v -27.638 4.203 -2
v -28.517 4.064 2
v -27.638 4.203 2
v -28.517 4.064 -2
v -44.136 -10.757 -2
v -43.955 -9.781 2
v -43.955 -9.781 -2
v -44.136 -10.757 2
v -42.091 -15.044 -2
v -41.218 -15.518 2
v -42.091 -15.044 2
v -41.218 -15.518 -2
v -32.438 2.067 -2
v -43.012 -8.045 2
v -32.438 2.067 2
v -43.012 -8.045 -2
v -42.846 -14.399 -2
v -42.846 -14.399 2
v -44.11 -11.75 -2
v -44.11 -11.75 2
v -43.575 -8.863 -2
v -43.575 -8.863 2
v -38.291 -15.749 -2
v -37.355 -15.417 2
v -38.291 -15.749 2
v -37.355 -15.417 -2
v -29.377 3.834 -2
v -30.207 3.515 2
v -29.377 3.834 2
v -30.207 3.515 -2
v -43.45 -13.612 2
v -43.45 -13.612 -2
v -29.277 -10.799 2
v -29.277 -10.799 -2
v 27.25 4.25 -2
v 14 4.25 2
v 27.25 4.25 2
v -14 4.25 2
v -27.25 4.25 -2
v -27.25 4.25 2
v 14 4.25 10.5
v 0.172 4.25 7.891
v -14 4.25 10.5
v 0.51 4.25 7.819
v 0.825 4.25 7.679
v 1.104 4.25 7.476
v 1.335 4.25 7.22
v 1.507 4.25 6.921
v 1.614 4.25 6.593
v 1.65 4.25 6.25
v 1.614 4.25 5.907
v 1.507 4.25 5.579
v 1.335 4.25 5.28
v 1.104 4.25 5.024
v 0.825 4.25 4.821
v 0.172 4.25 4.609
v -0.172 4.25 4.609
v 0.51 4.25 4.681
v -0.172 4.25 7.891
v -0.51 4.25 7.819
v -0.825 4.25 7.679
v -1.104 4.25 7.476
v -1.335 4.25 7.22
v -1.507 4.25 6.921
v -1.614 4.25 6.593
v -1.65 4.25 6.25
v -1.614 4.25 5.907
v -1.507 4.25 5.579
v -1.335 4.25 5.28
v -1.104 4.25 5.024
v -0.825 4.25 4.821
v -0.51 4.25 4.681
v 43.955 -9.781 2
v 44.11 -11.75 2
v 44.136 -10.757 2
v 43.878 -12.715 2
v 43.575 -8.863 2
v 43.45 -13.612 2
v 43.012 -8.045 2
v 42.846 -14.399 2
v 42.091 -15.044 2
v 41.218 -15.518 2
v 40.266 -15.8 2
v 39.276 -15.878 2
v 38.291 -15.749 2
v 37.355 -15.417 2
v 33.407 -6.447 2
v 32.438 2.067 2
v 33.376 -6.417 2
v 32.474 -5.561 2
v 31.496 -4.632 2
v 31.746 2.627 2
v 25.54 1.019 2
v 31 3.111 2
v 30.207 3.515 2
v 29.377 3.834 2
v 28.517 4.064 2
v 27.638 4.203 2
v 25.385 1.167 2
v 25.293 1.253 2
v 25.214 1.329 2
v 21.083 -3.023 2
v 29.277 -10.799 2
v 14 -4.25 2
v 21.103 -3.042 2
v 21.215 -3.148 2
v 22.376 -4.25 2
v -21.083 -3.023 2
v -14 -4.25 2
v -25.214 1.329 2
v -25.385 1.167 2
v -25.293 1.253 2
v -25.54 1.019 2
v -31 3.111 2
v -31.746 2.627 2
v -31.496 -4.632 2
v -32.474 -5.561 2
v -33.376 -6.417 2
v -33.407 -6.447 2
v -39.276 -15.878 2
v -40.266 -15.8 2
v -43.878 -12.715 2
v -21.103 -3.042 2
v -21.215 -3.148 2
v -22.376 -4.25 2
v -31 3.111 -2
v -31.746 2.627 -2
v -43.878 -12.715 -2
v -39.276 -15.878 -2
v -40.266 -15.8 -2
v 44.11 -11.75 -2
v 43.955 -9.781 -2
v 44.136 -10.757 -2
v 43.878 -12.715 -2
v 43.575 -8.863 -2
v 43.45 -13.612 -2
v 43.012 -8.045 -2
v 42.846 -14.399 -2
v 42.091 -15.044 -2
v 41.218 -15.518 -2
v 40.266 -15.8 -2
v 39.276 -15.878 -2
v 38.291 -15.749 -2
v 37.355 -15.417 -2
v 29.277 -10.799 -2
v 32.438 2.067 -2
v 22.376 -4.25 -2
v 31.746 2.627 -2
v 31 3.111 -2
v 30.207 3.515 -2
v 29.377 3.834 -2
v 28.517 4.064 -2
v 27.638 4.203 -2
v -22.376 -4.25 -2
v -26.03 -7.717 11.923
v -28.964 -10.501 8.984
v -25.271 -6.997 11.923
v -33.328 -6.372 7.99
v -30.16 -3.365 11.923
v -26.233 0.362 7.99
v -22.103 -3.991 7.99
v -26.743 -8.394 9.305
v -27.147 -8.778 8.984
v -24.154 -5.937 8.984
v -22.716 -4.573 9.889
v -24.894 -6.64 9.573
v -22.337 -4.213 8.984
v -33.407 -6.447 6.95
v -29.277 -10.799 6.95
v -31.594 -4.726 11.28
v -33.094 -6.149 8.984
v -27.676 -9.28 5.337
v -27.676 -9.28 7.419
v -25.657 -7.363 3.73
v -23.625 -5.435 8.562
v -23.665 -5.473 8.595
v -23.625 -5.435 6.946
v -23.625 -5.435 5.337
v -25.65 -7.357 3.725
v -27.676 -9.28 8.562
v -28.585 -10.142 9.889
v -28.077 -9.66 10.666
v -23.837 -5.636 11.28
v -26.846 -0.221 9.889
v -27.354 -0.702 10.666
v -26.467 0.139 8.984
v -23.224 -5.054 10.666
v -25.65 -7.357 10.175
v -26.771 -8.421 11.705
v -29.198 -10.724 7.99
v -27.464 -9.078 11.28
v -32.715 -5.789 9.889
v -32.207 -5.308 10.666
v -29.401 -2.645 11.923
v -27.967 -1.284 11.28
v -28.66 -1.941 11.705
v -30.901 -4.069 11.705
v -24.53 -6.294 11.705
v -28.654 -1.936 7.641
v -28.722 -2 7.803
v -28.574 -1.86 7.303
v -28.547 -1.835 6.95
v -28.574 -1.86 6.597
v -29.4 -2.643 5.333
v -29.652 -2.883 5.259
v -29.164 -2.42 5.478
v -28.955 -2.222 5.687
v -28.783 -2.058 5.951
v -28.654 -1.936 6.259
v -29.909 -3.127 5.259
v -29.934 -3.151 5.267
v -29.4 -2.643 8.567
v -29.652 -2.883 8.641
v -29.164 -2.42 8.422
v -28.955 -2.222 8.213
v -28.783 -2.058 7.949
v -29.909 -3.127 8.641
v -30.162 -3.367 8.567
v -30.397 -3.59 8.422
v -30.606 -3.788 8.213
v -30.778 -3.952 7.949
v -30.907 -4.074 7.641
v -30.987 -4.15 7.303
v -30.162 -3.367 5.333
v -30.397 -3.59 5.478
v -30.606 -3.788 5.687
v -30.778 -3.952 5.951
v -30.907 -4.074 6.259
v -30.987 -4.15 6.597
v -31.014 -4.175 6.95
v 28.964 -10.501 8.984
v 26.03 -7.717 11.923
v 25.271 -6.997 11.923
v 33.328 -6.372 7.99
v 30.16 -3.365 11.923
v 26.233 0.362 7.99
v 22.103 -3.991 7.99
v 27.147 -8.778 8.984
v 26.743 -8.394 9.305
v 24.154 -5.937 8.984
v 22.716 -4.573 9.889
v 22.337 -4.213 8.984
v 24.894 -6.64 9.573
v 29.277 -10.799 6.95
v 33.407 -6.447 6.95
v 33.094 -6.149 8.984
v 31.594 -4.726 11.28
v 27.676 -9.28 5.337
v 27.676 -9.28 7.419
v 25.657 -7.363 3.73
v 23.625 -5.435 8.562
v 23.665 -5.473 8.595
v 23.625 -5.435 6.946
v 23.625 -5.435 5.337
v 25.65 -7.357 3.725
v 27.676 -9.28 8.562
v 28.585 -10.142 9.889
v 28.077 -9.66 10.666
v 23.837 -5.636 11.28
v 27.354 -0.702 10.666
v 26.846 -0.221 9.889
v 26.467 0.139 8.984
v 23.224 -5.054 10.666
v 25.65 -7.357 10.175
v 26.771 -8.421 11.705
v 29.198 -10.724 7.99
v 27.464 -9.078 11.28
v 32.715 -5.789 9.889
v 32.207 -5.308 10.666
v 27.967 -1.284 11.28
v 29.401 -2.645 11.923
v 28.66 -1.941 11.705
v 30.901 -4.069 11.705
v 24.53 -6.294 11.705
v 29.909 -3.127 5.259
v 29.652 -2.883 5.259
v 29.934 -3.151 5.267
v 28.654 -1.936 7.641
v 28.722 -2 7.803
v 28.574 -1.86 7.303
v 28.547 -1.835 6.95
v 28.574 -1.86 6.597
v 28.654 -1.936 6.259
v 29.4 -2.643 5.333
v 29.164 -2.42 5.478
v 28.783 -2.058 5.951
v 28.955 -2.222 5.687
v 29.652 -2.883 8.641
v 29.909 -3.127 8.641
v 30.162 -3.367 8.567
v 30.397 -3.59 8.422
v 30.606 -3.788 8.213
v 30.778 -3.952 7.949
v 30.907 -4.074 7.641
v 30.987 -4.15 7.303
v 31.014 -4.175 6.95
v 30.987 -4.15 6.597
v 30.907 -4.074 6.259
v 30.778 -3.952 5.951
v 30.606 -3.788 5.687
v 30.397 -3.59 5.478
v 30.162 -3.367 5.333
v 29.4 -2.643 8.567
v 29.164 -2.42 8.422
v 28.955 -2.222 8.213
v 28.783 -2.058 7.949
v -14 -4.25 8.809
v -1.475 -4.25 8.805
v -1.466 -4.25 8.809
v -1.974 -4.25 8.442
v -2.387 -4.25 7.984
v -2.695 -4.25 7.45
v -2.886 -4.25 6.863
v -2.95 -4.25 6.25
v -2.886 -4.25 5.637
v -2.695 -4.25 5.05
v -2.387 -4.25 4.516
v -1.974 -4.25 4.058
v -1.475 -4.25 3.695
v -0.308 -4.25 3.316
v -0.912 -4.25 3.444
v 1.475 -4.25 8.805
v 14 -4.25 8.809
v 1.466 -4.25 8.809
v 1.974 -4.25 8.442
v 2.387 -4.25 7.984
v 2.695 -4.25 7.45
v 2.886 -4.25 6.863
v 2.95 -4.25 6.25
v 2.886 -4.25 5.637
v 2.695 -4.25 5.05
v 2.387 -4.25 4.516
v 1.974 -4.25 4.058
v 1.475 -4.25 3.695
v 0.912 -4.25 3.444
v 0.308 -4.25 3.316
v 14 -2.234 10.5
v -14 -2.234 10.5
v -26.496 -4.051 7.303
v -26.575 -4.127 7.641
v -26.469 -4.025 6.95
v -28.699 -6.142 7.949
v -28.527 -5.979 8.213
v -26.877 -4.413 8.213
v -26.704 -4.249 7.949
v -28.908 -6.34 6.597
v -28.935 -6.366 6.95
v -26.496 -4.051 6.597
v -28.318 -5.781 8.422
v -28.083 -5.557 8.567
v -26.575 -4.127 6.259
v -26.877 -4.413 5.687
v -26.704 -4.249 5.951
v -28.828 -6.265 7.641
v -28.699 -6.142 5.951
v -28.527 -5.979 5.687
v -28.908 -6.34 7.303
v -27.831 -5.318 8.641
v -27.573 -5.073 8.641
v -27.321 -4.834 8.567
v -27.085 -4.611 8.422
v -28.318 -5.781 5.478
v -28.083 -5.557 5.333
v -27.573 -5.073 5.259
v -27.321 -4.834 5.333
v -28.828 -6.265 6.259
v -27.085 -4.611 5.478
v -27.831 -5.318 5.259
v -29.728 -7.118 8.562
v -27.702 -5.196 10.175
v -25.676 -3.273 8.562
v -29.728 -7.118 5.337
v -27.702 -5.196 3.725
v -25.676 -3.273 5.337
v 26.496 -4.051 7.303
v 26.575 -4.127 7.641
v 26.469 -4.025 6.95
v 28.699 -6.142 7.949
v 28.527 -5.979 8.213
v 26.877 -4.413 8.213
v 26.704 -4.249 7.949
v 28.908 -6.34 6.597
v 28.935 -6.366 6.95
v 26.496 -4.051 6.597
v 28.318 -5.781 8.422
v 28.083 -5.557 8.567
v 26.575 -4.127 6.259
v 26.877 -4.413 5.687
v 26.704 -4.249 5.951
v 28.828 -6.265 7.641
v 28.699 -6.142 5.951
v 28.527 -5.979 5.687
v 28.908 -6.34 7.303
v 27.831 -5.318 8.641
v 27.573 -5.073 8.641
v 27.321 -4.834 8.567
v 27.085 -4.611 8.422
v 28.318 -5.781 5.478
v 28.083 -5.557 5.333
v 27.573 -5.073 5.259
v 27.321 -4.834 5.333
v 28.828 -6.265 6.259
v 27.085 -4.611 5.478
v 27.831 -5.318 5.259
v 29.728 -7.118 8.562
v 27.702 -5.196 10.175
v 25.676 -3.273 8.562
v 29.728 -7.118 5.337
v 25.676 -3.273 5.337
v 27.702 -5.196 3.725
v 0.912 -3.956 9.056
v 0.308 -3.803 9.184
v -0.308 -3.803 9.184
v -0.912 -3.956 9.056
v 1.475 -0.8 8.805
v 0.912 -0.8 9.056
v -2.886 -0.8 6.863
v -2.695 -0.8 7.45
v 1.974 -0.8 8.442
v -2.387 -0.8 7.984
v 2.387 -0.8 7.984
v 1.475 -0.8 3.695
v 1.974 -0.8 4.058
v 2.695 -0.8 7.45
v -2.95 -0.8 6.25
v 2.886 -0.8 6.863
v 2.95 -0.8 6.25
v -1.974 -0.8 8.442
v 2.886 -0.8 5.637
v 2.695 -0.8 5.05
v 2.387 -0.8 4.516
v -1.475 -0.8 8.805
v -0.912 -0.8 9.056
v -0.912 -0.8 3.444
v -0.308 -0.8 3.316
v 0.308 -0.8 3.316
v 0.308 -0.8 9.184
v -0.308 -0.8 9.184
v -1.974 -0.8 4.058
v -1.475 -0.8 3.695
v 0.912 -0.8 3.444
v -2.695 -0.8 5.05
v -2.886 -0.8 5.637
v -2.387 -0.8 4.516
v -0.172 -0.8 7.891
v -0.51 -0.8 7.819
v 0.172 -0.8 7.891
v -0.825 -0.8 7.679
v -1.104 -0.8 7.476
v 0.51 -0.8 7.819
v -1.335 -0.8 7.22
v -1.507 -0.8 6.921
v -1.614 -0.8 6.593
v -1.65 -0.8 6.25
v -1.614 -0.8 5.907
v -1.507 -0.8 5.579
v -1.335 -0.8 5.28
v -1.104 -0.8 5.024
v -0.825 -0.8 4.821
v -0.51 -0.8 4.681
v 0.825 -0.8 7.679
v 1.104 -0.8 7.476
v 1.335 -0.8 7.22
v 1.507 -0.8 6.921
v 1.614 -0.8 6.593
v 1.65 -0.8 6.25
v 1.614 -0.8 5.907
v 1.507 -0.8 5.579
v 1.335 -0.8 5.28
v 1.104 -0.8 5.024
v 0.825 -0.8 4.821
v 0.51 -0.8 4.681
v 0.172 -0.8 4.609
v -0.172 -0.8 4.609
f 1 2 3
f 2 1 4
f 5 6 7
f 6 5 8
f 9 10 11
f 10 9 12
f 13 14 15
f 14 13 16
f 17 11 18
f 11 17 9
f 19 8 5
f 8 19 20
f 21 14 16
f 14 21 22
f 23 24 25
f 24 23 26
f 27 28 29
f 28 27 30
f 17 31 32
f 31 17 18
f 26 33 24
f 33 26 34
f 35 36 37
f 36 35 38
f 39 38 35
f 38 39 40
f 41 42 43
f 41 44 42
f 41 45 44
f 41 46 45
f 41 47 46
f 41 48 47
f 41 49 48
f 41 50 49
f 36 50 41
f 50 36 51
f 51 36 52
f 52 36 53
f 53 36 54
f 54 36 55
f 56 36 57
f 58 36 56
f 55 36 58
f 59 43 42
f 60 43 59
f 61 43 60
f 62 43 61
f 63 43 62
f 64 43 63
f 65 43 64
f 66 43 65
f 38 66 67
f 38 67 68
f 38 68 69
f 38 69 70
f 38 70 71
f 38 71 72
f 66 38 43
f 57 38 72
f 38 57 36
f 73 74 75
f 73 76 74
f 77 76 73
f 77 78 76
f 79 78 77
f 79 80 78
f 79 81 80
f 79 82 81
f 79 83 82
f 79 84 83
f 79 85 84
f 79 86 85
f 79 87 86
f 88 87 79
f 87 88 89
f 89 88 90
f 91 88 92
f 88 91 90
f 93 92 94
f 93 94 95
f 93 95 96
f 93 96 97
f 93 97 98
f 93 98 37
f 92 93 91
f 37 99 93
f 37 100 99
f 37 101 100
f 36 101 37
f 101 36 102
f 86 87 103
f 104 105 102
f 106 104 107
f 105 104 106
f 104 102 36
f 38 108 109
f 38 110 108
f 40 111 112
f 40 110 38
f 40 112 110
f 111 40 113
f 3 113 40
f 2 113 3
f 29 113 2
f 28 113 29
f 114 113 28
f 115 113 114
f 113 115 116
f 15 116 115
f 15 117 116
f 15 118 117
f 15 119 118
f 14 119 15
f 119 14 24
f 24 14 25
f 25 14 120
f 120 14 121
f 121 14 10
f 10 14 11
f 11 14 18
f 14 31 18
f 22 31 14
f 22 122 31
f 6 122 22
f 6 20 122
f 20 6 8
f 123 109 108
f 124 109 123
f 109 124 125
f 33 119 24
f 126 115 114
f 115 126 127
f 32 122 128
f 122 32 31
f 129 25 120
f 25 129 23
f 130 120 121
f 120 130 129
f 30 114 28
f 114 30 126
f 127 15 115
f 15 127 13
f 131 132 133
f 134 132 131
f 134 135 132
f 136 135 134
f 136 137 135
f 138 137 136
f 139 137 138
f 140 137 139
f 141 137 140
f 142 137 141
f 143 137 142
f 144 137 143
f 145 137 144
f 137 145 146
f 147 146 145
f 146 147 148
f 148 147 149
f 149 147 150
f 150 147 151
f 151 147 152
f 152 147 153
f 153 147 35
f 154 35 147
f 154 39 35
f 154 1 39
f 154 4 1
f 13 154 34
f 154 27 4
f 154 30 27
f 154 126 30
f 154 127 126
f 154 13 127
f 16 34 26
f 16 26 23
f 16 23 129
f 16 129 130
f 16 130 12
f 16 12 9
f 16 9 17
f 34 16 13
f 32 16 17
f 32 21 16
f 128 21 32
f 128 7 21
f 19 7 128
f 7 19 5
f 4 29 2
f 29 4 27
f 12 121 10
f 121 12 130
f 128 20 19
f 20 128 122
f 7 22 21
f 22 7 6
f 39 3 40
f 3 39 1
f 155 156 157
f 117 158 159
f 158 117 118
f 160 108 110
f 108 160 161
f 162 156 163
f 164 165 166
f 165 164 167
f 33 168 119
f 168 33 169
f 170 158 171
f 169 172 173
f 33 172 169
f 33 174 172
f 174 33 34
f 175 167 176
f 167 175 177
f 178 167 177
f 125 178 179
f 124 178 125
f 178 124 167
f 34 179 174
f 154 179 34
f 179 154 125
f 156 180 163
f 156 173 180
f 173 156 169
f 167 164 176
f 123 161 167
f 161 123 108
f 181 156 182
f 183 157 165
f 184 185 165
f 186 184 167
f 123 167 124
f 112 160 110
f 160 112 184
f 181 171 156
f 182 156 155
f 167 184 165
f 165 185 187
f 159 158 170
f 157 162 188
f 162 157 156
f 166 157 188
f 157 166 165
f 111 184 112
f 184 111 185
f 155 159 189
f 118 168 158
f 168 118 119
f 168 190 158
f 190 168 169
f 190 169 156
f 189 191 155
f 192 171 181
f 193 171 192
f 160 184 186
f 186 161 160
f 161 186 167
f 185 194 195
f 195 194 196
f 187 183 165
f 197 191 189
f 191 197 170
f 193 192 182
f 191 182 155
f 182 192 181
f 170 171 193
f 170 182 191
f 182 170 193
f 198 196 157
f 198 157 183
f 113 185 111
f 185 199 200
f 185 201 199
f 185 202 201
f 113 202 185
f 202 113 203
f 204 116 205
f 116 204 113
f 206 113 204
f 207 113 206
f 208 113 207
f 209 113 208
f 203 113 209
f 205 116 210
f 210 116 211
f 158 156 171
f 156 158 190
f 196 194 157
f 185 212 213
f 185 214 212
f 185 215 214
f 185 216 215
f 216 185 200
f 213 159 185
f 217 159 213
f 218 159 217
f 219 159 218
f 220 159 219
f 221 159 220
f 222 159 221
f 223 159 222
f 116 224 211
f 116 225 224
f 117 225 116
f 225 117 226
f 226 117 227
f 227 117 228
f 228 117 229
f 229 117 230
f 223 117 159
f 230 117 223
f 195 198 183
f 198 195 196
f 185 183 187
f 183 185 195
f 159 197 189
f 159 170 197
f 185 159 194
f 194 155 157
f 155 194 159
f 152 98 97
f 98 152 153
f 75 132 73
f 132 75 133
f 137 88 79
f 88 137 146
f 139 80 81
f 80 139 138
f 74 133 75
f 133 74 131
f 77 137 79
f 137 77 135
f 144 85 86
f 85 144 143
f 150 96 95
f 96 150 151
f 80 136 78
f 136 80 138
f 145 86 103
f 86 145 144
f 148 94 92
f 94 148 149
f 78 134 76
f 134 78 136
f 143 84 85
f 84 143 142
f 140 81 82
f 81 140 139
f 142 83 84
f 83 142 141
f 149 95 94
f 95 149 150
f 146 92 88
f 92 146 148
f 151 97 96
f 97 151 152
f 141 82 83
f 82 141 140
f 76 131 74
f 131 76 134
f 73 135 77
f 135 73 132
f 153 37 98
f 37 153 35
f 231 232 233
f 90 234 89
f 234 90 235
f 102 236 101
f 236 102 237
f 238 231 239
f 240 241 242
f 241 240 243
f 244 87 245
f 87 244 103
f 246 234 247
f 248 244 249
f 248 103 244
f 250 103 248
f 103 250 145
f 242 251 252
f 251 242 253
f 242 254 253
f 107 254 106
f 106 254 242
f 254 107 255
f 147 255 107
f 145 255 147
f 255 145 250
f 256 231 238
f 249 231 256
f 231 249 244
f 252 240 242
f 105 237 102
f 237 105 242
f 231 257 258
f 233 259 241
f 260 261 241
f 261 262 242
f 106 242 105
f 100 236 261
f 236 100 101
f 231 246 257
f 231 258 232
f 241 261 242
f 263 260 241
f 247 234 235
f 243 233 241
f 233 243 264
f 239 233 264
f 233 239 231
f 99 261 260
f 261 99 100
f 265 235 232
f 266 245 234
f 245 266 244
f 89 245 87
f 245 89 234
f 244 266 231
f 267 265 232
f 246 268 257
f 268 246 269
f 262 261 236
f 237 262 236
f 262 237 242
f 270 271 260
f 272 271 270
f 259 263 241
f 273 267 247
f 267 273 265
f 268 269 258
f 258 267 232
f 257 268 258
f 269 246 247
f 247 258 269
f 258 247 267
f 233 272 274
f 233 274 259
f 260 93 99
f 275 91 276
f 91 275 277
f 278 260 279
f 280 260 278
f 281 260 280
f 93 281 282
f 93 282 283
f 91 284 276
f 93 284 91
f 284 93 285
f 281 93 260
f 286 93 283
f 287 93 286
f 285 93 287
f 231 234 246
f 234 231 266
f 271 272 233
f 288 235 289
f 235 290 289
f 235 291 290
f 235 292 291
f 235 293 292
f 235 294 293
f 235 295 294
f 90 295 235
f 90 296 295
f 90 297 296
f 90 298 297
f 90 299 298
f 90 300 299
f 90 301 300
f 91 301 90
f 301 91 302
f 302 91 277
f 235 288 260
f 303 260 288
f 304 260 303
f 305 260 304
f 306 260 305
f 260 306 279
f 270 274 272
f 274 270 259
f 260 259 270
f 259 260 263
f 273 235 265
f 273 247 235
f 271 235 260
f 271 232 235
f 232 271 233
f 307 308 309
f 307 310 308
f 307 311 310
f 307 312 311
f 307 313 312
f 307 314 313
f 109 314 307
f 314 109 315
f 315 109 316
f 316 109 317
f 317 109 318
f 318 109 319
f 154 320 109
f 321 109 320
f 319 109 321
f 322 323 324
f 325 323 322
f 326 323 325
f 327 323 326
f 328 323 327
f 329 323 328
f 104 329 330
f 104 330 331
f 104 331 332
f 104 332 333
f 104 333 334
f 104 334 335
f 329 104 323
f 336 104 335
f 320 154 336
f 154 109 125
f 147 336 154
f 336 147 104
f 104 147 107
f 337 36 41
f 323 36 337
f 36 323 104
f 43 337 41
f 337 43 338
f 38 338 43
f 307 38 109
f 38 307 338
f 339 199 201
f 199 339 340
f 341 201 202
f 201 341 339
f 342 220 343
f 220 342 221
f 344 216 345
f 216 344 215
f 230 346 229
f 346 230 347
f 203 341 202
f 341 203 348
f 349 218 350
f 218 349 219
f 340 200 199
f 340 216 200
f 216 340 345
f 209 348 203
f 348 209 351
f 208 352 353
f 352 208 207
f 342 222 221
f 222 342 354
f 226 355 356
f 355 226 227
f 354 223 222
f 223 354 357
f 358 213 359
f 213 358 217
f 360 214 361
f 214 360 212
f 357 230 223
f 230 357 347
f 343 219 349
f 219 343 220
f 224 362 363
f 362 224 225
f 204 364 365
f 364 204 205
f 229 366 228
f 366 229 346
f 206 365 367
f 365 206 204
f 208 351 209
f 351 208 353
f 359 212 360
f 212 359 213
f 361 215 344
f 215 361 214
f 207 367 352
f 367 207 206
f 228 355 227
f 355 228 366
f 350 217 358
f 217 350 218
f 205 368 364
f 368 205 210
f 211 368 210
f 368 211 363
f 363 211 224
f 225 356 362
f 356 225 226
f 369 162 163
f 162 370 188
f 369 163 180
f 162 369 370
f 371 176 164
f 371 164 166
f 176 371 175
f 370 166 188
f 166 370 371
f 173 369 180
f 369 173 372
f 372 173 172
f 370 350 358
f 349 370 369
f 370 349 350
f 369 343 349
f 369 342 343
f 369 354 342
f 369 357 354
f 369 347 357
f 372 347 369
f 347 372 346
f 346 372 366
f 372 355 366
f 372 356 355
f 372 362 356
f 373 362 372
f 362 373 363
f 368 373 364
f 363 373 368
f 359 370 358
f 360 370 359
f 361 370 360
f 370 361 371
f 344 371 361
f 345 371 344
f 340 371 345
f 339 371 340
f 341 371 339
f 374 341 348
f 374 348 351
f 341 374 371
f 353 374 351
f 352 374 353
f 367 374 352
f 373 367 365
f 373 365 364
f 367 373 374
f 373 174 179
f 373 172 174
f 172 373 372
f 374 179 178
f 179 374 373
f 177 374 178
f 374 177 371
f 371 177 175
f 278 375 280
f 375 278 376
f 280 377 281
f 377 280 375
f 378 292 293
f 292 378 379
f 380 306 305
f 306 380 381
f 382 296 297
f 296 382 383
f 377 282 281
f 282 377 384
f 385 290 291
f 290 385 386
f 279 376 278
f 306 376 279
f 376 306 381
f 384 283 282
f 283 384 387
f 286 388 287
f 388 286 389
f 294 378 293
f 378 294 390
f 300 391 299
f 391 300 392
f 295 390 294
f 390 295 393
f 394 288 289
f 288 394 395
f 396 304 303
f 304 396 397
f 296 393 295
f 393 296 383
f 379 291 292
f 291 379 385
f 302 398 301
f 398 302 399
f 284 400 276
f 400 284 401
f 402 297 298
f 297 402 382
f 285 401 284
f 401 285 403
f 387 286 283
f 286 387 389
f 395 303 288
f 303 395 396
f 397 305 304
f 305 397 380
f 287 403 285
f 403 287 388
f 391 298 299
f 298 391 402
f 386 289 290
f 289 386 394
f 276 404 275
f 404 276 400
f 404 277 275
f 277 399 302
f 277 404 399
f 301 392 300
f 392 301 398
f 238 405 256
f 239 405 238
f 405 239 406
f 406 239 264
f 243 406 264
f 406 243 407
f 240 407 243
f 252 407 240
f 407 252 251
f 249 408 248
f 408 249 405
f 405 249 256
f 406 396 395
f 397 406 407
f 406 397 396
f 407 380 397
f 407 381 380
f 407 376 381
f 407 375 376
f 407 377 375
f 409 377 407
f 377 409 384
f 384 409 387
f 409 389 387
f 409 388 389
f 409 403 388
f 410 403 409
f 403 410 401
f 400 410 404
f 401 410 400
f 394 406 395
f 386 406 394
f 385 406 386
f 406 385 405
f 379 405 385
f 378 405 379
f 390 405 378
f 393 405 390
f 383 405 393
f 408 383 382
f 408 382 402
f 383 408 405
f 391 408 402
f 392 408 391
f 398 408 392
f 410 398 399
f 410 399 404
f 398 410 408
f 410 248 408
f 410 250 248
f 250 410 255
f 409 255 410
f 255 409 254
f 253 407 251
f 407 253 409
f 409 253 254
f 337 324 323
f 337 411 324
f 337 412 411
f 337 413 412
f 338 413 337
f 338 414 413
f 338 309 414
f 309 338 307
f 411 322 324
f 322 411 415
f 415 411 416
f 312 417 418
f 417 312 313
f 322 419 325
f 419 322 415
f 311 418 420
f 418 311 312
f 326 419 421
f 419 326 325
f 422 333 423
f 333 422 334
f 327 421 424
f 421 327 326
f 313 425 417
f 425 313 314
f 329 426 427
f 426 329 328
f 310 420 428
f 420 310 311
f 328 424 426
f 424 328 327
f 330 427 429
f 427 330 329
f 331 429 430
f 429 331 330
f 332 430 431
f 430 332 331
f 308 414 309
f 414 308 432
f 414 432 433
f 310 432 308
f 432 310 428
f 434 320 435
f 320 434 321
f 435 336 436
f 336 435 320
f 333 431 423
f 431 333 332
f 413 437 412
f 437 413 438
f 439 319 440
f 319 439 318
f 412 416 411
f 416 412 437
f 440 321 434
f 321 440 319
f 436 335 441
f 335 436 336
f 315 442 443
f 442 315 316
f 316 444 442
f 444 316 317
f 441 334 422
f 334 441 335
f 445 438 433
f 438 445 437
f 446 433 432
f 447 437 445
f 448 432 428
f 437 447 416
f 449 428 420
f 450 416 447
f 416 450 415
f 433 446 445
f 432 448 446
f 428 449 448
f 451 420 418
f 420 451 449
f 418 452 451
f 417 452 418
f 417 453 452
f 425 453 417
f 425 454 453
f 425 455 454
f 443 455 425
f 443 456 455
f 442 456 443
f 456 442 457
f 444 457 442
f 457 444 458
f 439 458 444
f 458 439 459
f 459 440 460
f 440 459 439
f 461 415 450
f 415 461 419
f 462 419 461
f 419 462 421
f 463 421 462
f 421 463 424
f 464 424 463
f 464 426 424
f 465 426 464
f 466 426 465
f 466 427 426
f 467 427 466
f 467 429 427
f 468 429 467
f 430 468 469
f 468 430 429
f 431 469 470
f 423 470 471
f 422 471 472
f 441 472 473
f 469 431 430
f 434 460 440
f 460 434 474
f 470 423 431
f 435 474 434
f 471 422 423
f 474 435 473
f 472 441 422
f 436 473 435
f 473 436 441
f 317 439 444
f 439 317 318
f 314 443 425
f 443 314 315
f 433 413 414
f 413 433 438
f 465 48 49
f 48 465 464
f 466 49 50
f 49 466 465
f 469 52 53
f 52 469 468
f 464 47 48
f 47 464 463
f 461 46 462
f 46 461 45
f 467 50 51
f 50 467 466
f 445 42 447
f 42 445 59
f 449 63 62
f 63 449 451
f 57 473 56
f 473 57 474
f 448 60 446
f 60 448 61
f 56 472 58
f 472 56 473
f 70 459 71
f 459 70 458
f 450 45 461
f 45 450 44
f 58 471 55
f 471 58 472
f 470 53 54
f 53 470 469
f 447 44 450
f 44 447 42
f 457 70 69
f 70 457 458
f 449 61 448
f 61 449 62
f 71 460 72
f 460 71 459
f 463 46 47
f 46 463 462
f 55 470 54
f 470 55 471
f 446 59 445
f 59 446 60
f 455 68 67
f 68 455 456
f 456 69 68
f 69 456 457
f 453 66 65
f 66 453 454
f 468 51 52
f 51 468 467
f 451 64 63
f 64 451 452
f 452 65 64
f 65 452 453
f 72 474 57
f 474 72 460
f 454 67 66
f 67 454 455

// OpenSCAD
$fn=30;
diamM3=6.25+.2;

holder();

module holder()
{
	difference()
	{
		holder_plain();
		holder_void();
	}
}

module holder_plain()
{
	//base
	cube([50.5, 8.5, 4], true);
	
	//top fix
	translate([0, 0, 6.25]) cube([28, 8.5, 8.5], true);
	
	//sides
	for(i=[-1,1]) mirror([(i==1)?1:0, 0, 0])
	{
		hull()
		{
			intersection()
			{
				translate([-25-1.75, -8.5/2, 0]) cylinder(r=8.5, h=4, center=true, $fn=60);
				translate([-32, 0, 0]) cube([10, 8.5, 4], true);
			}
			translate([-25.25, -4.25, 0]) rotate([0, 0, 43.5]) translate([-15, 9.5/2, 0]) cylinder(r=9.5/2, h=4, center=true);
			translate([-26.25, 0, 0]) cube([2, 8.5, 4], true);
			translate([-25.25, -4.22, 0]) rotate([0, 0, 43.5]) translate([-1.45, 1, 0]) cube([12, 6, 4], center=true);
		}
		
		translate([-25.25, -4.22, 0]) rotate([0, 0, 43.5]) hull()
		{
			translate([-2.45, 1, 6.95]) rotate([90, 0, 0]) cylinder(r=5, h=6, center=true);
			translate([-1.45, 1, -1.5]) cube([12, 6, 1], center=true);
		}
	}
}

module holder_void()
{
	//top fix
	translate([0, -4.75, 11]) rotate([40, 0, 0]) cube([28.5, 4, 4], true);

	//top holes
	translate([0, -.8, 6.25]) rotate([90, 0, 0]) cylinder(r=2.95, h=4);
	translate([0, 0, 6.25]) rotate([90, 0, 0]) cylinder(r=1.65, h=10, center=true);

	//sides hole
	for(i=[-1,1]) mirror([(i==1)?1:0, 0, 0]) translate([-25.25, -4.22, 0]) rotate([0, 0, 43.5])
	{
		translate([-2.45, 1.5, 6.95]) rotate([90, 0, 0]) cylinder(r=1.7, h=20, center=true);
		translate([-2.45, -.52, 6.95]) rotate([90, 0, 0]) rotate([0, 0, 30]) cylinder(r=diamM3/2, h=3, center=true, $fn=6);
	}
}
